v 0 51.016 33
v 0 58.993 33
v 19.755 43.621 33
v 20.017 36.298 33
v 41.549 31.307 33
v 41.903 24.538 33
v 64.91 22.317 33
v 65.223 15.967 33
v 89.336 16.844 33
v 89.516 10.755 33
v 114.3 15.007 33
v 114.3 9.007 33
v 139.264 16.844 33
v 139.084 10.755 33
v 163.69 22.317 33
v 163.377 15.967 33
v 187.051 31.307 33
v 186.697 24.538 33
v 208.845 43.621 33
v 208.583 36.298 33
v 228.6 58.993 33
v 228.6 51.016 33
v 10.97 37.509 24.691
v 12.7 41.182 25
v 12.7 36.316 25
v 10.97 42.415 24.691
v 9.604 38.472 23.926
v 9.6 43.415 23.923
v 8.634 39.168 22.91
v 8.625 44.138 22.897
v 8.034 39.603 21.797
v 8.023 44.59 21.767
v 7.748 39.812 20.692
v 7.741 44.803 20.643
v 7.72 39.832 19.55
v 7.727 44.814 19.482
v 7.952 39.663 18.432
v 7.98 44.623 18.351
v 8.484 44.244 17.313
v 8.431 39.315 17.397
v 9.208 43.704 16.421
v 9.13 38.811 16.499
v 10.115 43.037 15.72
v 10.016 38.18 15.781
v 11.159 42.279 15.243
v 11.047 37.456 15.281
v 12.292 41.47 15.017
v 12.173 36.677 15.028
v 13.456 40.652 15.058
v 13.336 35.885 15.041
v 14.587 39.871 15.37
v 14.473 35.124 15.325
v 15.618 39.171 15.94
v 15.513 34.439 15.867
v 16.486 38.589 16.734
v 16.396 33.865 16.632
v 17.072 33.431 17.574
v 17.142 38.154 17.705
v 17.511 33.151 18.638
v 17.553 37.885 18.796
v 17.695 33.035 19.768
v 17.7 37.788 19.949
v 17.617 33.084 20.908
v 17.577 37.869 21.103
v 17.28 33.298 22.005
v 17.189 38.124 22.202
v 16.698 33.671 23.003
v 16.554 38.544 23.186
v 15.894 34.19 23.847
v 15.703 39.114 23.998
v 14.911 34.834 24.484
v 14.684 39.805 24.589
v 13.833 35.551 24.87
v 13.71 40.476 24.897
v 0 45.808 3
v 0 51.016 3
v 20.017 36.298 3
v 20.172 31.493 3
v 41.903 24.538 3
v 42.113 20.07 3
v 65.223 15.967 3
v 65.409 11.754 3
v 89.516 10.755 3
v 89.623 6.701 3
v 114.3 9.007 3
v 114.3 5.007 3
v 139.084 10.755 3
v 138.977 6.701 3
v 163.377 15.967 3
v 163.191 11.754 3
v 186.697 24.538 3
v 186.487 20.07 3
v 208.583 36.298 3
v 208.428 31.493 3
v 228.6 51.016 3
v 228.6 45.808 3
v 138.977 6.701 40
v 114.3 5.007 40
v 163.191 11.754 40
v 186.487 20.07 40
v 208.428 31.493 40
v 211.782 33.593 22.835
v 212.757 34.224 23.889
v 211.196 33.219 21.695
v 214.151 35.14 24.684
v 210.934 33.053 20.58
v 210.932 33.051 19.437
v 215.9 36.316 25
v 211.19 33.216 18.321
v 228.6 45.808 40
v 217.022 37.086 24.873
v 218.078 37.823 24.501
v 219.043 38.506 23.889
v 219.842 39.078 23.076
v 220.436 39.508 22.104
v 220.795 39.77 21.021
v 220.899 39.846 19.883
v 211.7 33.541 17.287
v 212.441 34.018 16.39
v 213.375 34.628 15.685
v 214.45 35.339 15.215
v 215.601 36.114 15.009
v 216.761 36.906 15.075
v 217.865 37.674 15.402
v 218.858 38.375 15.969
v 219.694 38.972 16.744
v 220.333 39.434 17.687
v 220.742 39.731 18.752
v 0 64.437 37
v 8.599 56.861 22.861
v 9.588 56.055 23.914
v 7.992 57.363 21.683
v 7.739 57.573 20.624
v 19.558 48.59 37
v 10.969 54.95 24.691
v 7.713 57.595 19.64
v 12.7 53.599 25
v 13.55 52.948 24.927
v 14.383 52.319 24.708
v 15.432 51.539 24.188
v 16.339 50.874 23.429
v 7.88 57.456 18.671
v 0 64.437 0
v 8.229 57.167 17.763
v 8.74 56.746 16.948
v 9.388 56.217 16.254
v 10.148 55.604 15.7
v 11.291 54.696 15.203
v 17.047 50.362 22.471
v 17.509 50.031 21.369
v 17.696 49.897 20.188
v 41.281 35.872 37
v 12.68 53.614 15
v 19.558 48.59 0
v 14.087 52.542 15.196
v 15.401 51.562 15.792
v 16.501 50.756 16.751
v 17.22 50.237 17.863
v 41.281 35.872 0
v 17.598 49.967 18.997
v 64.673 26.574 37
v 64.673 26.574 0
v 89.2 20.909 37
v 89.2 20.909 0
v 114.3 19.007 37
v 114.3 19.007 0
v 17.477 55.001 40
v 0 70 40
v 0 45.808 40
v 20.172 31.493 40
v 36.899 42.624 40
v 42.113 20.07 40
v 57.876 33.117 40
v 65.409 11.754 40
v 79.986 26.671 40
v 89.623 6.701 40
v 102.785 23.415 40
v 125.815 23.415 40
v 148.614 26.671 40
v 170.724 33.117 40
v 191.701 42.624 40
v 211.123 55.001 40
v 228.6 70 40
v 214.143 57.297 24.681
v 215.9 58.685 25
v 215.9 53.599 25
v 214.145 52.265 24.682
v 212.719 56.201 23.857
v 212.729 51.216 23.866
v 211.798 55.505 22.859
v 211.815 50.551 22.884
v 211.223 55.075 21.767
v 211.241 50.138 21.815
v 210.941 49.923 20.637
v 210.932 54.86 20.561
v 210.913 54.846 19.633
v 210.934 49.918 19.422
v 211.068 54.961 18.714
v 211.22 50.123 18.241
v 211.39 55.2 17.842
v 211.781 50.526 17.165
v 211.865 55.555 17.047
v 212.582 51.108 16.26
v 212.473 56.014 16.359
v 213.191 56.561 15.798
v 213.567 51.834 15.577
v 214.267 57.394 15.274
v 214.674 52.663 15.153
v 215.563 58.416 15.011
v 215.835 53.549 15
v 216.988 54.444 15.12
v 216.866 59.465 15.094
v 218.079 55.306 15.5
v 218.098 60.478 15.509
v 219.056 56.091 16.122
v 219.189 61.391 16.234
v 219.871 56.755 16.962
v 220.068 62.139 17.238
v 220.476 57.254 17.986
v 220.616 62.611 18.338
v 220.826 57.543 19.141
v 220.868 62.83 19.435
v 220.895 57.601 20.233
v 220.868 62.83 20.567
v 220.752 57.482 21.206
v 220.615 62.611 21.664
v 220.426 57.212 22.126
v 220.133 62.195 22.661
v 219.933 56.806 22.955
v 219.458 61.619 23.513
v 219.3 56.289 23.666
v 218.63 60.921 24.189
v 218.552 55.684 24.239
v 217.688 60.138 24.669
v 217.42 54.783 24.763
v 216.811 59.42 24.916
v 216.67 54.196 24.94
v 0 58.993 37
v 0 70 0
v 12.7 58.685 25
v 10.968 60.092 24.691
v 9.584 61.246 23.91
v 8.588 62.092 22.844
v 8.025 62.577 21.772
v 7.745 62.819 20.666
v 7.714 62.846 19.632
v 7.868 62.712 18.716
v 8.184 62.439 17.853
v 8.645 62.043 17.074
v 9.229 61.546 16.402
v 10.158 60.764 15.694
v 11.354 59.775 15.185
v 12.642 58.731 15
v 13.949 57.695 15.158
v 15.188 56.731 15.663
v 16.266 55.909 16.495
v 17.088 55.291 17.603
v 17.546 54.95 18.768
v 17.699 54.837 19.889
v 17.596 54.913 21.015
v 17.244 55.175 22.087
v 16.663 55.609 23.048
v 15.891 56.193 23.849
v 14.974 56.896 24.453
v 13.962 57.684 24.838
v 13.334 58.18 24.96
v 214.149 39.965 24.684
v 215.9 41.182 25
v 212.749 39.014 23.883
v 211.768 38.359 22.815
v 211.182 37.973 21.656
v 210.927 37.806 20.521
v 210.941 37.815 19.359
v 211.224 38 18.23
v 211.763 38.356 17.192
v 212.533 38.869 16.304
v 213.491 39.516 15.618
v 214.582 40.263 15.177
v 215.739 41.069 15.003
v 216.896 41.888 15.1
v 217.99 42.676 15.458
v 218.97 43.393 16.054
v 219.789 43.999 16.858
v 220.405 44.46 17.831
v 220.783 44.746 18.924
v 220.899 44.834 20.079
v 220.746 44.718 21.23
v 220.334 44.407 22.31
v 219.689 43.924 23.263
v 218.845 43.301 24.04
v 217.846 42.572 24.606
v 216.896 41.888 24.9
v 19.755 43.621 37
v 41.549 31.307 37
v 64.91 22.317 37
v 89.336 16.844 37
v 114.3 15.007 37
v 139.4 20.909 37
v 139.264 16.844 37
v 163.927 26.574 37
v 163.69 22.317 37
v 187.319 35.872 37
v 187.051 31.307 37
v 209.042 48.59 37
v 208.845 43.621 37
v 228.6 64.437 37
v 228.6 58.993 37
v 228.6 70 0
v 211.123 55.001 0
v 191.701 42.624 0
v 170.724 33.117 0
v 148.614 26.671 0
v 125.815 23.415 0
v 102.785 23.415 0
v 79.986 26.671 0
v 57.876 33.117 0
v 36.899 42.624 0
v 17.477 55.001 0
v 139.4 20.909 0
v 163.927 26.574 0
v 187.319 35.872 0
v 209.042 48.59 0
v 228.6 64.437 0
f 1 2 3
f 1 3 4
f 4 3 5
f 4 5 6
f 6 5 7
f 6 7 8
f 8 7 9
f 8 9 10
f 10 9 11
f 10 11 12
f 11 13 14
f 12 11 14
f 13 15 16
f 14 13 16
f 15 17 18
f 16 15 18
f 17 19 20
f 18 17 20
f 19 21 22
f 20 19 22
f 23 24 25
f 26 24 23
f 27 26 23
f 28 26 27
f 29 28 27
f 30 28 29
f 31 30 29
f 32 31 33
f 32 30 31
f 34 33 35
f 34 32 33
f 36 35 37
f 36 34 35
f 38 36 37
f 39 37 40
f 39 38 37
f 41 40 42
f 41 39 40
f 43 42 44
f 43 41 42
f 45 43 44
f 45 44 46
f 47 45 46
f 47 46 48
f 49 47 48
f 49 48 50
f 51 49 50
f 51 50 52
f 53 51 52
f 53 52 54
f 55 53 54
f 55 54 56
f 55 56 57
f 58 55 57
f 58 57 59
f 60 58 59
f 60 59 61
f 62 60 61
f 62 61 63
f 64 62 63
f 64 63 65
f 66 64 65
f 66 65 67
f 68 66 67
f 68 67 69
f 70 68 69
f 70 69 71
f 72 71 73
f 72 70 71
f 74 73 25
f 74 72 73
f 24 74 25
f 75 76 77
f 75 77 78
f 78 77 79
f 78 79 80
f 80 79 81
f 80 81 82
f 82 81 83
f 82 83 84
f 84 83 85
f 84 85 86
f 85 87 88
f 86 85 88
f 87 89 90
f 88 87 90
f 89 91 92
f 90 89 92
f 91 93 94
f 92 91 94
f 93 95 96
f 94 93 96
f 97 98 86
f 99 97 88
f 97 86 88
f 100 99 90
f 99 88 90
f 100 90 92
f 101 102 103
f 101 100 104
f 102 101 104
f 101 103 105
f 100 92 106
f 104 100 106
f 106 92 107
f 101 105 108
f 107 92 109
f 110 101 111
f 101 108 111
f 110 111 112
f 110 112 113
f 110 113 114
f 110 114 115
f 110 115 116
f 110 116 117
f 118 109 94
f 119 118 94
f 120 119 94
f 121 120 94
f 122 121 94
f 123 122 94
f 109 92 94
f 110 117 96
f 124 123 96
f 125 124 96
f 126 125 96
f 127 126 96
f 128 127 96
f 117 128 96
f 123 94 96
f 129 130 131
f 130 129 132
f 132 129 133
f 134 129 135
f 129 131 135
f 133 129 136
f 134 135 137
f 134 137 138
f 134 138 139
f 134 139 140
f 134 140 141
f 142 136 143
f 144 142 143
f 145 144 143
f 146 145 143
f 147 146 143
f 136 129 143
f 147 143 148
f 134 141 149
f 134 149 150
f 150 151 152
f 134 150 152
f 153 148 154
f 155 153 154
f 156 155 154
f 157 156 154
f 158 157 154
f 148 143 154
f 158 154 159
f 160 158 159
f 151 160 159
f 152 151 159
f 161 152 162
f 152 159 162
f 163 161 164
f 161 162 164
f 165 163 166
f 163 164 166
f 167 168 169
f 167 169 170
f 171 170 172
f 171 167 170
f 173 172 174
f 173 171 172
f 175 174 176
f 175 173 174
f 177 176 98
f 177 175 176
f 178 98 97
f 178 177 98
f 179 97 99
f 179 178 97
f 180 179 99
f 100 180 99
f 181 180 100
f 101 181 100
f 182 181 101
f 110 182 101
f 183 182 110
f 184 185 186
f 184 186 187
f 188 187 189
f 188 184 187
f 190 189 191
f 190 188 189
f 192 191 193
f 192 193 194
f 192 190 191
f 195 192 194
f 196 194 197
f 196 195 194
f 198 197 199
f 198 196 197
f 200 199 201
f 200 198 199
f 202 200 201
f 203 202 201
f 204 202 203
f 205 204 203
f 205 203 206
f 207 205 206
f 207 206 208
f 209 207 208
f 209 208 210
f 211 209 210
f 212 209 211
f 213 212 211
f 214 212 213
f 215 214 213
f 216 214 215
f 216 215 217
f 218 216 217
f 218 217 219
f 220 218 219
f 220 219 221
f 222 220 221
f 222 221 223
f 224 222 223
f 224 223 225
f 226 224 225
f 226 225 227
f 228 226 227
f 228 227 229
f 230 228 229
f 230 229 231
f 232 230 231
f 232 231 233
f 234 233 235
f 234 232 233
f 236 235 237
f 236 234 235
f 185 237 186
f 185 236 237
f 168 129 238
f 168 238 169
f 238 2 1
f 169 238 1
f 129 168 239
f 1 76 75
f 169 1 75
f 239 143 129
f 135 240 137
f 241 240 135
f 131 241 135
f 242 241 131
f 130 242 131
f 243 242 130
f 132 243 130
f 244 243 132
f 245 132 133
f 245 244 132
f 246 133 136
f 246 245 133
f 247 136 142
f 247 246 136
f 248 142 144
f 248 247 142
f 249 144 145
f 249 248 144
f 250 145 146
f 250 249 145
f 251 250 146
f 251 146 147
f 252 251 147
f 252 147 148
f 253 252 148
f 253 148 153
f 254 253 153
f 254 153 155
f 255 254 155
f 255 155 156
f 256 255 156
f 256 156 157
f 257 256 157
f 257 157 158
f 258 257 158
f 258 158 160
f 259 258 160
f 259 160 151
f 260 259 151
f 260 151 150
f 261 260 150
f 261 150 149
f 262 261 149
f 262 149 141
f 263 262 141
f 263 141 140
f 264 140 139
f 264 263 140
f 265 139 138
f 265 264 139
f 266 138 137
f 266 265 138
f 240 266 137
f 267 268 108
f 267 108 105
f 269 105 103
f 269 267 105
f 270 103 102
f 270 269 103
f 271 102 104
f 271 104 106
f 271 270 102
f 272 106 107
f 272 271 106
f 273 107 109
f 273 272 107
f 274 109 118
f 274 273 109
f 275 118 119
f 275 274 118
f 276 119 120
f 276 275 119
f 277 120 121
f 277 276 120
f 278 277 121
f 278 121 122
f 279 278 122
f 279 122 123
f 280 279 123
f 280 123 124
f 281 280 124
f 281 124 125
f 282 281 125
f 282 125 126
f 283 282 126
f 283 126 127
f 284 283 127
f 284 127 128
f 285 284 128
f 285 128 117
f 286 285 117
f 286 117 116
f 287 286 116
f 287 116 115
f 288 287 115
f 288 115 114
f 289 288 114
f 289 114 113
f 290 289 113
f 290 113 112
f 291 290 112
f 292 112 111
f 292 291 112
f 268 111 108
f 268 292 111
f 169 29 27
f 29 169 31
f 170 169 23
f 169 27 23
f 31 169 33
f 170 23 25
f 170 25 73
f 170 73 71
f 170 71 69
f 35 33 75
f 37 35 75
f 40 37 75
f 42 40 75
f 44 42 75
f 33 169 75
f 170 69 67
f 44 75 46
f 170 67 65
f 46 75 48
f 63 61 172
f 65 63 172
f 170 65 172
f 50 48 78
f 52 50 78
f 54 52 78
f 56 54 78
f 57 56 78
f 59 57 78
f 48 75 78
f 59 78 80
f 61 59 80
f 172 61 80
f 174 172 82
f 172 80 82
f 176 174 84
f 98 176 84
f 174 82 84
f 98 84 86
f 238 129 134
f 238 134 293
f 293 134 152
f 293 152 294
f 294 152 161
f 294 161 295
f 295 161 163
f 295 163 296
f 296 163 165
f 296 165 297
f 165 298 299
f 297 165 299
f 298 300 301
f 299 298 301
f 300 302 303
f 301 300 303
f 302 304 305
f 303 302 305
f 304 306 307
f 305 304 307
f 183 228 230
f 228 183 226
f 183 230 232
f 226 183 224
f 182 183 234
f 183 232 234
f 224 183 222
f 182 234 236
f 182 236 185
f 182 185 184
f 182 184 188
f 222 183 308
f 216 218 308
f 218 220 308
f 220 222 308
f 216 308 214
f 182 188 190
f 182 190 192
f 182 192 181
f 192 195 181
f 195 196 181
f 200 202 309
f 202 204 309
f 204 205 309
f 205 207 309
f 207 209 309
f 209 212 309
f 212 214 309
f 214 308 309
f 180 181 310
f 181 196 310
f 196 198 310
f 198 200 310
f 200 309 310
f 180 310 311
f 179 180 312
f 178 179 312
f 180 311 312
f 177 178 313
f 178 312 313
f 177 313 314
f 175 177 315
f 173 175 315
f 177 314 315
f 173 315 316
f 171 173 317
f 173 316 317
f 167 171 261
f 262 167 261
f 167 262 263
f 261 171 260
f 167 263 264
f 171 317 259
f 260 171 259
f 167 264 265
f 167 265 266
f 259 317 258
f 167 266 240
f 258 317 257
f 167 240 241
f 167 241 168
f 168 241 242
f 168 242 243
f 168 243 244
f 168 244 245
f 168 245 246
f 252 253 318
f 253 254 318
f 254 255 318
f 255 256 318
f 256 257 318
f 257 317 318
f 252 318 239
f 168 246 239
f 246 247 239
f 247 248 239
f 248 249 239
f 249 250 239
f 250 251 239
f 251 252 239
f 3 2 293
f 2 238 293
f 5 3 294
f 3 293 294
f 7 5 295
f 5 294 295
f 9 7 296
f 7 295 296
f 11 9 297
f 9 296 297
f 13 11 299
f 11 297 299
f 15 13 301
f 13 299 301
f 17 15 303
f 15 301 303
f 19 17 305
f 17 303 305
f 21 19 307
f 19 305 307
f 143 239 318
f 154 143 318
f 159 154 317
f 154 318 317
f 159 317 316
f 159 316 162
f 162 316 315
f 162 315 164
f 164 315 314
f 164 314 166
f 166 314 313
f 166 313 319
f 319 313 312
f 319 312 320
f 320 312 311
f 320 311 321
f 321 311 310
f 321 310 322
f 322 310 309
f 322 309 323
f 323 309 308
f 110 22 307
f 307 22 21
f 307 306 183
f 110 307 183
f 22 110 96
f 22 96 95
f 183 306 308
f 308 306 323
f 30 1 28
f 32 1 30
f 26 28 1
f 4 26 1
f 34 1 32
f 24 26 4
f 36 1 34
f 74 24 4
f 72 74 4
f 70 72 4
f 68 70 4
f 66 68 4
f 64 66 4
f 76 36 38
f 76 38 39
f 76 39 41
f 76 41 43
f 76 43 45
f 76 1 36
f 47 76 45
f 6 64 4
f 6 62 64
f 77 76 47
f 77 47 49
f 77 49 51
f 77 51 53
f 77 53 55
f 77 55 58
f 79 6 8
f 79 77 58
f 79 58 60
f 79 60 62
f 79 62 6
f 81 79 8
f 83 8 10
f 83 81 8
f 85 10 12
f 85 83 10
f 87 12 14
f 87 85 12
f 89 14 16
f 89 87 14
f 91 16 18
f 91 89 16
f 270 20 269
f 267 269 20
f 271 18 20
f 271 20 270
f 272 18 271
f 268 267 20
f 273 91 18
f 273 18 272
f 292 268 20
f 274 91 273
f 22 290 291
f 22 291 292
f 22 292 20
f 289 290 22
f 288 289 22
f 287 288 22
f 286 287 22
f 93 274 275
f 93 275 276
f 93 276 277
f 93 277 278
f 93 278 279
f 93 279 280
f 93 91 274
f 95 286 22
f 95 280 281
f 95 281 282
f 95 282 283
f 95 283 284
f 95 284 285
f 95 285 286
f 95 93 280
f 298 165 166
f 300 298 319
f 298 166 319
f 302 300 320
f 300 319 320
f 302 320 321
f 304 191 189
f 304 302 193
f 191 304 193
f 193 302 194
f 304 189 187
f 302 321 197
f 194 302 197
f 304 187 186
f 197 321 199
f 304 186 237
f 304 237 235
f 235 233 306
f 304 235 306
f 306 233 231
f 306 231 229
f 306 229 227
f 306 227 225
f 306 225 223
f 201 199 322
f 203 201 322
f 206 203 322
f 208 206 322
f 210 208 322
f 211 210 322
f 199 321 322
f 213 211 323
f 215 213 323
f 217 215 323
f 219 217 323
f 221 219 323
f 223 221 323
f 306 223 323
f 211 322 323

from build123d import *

# Parameters (mm, degrees)
BOSS_EXTRUDE1_DEPTH     = 40
SKETCH2_W               = 26
SKETCH2_H               = 6
CUT_EXTRUDE1_DEPTH      = 243.400412541
CUT_EXTRUDE1_DEPTH_BACK = 243.400412541
SKETCH4_R               = 2.5
SKETCH7_R               = 5
CUT_EXTRUDE3_DEPTH      = 62


with BuildPart() as part:
    # Sketch1 → Boss-Extrude1 (new body)
    with BuildSketch(Plane.XY):
        with BuildLine():
            Line((0, 0), (228.6, 0))
            Line((228.6, 0), (228.6, 70))
            ThreePointArc((228.6, 70), (114.3, 23.006536612), (0, 70))
            Line((0, 70), (0, 0))
        make_face()
    extrude(amount=BOSS_EXTRUDE1_DEPTH)

    # Sketch2 → Cut-Revolve1 (revolve, cut)
    with BuildSketch(Plane(origin=(114.3, 0, 0), x_dir=(0, 0, -1), z_dir=(1, 0, 0))):
        with Locations((-20, 12.006536612)):
            Rectangle(SKETCH2_W, SKETCH2_H)
    revolve(axis=Axis((114.3, 185.506536612, 40), (0, 0, 1)), mode=Mode.SUBTRACT)

    # Sketch4 → Cut-Extrude1 (cut, two sides: drawn at the far end of the back side and taken through both)
    with BuildSketch(Plane.XZ.offset(-CUT_EXTRUDE1_DEPTH_BACK)):
        with Locations(Location((12.7, 20, 0), (0, 0, 270))):
            Circle(SKETCH4_R)
        with Locations(Location((215.9, 20, 0), (0, 0, 270))):
            Circle(SKETCH4_R)
    extrude(amount=CUT_EXTRUDE1_DEPTH + CUT_EXTRUDE1_DEPTH_BACK, mode=Mode.SUBTRACT)

    # Sketch7 → Cut-Extrude3 (cut)
    with BuildSketch(Plane(origin=(0, 70, 0), x_dir=(-1, 0, 0), z_dir=(0, -1, 0))):
        with Locations(Location((-215.9, -20, 0), (0, 0, 270))):
            Circle(SKETCH7_R)
        with Locations(Location((-12.7, -20, 0), (0, 0, 270))):
            Circle(SKETCH7_R)
    extrude(amount=CUT_EXTRUDE3_DEPTH, mode=Mode.SUBTRACT)

    # Sketch8 → Cut-Revolve4 (revolve, cut)
    with BuildSketch(Plane(origin=(114.3, 0, 0), x_dir=(0, 0, -1), z_dir=(1, 0, 0))):
        Polygon((-7, 15.006536612), (-37, 15.006536612), (-37, 19.006536612), (0, 19.006536612), (0, -48.777467523), (-40, -48.777467523), (-40, 5.006536612), (-3, 5.006536612), (-3, 9.006536612), (-7, 9.006536612), align=None)
    revolve(axis=Axis((114.3, 185.506536612, 40), (0, 0, 1)), mode=Mode.SUBTRACT)


solid = part.part
